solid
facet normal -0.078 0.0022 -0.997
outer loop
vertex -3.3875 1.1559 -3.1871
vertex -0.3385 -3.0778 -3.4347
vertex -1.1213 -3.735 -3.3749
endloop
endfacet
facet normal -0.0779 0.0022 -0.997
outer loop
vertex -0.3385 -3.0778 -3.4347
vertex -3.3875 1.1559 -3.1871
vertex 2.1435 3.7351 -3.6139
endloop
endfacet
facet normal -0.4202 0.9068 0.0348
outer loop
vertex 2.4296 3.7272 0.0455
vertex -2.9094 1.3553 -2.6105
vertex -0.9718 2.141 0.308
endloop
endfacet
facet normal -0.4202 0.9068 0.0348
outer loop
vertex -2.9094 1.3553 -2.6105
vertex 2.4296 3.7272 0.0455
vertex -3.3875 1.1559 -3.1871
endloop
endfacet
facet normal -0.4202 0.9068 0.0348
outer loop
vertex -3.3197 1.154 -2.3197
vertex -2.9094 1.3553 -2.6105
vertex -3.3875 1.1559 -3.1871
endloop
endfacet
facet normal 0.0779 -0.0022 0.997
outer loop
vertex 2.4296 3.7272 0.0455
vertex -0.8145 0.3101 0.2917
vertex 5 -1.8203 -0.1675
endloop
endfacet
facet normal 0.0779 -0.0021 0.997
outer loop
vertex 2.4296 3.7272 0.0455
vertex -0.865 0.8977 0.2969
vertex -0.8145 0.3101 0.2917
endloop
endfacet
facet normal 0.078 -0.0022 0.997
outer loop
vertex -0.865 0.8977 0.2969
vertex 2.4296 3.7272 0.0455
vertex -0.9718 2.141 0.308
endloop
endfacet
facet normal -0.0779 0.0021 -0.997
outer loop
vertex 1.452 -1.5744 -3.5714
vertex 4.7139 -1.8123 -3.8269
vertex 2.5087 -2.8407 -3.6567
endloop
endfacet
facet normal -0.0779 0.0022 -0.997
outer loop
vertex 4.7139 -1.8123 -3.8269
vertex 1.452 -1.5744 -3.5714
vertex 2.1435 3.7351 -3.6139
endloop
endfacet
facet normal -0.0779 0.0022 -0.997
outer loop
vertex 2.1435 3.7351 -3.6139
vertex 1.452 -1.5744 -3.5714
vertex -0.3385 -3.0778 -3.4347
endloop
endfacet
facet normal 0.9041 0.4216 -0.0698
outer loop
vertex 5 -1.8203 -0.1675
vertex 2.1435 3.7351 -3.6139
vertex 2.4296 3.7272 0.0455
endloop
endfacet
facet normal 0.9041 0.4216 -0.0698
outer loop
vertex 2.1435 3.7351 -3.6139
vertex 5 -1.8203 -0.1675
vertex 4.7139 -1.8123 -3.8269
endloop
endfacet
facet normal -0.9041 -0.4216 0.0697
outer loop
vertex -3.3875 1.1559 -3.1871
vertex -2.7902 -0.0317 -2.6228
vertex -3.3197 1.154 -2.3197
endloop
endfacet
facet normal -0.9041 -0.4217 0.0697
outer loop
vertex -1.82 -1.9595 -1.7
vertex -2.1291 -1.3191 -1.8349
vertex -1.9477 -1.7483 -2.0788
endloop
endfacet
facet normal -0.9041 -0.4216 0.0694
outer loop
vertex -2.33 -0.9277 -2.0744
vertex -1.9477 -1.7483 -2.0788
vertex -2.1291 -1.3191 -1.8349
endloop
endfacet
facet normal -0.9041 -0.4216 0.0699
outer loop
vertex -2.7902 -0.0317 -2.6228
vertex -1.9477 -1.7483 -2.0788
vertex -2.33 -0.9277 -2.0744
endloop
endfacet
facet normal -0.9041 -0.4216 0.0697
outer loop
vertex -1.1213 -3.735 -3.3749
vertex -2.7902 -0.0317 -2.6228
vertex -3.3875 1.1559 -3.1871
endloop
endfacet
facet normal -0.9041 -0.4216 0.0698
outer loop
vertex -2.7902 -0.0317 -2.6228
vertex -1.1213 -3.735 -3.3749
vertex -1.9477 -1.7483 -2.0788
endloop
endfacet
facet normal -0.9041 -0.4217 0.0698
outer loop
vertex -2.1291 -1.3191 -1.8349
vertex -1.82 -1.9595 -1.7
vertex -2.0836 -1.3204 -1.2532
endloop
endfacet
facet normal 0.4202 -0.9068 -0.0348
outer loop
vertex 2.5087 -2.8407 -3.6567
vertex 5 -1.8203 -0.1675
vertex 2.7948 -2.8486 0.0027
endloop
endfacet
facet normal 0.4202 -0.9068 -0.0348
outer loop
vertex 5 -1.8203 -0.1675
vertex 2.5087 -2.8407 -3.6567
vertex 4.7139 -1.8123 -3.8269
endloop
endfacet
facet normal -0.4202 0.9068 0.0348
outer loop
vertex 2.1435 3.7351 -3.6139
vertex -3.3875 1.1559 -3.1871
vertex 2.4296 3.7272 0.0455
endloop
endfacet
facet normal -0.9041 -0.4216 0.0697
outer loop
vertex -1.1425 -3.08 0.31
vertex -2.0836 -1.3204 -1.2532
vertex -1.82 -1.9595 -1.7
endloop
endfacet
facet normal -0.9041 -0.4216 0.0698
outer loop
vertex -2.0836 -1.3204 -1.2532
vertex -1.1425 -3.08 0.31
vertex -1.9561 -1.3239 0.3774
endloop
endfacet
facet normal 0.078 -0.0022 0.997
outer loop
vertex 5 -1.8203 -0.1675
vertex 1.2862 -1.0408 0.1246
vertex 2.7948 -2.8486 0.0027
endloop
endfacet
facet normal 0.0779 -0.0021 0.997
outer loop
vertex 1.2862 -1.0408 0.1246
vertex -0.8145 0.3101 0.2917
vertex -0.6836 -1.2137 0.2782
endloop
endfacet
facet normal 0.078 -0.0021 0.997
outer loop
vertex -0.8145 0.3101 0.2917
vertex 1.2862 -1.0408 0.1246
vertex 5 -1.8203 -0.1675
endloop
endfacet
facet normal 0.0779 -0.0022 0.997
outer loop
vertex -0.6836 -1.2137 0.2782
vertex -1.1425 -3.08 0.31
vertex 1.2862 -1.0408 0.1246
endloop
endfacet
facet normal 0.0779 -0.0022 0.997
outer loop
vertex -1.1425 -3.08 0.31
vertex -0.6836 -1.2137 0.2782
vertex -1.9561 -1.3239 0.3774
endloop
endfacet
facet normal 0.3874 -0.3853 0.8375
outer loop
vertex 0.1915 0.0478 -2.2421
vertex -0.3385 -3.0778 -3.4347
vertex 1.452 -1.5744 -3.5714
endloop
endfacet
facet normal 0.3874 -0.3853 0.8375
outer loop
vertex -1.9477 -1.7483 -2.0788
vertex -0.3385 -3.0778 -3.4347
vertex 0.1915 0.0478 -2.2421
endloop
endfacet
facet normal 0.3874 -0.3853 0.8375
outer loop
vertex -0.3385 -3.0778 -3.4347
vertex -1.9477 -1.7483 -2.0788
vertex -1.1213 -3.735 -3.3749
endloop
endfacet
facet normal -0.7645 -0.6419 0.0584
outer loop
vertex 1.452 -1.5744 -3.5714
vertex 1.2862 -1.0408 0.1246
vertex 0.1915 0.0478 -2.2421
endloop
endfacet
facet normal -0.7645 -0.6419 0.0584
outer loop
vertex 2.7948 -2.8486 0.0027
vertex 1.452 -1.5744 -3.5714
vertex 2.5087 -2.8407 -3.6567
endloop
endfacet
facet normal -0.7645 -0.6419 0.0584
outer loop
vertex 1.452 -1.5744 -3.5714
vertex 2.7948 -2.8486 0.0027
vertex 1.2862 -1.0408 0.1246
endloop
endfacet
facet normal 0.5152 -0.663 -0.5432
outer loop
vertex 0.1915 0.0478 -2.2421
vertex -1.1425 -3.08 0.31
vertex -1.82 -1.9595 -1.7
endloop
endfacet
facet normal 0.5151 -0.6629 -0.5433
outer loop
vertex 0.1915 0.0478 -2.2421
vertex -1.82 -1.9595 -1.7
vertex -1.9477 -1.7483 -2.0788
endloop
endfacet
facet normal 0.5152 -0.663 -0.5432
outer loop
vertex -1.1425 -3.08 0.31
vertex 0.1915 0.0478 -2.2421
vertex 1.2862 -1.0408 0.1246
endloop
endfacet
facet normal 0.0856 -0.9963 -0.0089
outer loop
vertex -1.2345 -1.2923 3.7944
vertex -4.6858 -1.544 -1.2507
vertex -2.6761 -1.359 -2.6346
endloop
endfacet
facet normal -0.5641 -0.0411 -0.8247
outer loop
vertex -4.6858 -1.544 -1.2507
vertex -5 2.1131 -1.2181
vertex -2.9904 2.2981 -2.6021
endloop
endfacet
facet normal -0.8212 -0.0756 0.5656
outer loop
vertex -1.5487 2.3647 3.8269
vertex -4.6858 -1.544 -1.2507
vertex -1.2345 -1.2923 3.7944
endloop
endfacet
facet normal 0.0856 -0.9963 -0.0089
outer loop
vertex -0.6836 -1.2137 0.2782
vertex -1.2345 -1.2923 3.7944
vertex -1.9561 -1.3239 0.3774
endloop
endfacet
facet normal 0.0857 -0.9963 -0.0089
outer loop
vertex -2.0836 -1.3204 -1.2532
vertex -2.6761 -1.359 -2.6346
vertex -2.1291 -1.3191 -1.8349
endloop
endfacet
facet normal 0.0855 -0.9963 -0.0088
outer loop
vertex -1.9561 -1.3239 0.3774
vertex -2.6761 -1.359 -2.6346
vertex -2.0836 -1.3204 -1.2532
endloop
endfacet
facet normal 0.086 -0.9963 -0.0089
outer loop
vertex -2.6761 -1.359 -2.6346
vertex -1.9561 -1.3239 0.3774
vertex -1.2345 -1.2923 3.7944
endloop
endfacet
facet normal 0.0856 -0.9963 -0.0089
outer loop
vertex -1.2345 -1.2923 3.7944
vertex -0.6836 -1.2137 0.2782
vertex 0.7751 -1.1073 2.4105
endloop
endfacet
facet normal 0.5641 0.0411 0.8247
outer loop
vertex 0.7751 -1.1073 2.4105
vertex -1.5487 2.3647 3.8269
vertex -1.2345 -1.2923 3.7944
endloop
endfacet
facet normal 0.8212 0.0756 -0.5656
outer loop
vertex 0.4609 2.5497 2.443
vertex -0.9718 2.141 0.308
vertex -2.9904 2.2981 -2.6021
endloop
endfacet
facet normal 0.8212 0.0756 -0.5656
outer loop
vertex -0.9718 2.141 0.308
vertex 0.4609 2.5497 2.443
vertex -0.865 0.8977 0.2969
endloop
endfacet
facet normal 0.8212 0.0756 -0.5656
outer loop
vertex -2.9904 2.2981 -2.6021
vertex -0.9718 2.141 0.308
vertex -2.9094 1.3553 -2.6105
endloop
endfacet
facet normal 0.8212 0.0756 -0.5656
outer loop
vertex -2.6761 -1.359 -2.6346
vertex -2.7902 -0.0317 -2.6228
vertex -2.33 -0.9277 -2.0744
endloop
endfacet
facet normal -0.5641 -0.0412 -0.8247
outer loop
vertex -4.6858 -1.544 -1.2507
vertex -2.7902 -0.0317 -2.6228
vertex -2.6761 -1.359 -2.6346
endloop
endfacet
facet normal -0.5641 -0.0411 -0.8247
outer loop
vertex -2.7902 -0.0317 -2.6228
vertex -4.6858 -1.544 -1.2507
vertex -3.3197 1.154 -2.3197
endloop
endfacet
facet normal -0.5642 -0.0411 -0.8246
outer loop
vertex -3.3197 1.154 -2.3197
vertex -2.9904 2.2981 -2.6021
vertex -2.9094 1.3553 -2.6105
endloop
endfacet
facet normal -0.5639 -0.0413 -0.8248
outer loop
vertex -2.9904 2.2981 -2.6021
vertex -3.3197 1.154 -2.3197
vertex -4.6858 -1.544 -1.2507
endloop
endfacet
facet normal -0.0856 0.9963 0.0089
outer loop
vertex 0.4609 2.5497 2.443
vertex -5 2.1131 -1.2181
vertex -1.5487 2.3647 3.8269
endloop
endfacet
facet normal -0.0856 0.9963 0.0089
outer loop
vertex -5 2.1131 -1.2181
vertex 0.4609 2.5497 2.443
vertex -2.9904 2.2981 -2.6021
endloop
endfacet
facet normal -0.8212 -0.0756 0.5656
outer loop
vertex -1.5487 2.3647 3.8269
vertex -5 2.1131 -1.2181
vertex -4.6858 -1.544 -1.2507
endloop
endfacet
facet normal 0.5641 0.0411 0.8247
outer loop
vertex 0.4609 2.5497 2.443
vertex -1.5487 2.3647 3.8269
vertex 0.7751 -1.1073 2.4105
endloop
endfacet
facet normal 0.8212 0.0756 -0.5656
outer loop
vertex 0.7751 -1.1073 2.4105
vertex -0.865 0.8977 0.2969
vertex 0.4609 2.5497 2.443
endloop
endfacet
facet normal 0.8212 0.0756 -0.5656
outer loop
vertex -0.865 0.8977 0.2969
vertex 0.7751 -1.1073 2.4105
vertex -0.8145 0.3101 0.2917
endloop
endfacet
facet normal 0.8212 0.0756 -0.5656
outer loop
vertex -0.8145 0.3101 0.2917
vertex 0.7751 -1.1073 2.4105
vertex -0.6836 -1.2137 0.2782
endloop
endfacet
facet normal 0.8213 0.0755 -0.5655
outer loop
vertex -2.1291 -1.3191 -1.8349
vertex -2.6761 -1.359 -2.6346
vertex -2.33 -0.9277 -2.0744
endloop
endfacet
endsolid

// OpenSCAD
intersection() {
translate([-6.000011, -4.482134, -4.592319])
cube(size = [12.000012, 8.964288, 9.184668], center = false);
union() {
// Begin.
union() {
difference() {
rotate([-178, 4.00022, 25])
translate([0.705871, 0.698352, 1.60863])
cube(size = [6.11776, 6.11771, 3.6706], center = true);

rotate([-147.032, 3.34625, 40.017])
translate([-9.34601, 10.1425, -8.58897])
cube(size = [19.308, 17.7151, 20.8221], center = true);
}

difference() {
rotate([90.6156, 34.4411, 5.25889])
translate([-2.03397, -0.679381, -0.687115])
cube(size = [2.44705, 6.11776, 3.67067], center = true);

rotate([-178, 4.00022, 25])
translate([8.32351, -7.62141, 11.222])
cube(size = [21.353, 22.7572, 15.5561], center = true);
}
}
// End.
}
}
